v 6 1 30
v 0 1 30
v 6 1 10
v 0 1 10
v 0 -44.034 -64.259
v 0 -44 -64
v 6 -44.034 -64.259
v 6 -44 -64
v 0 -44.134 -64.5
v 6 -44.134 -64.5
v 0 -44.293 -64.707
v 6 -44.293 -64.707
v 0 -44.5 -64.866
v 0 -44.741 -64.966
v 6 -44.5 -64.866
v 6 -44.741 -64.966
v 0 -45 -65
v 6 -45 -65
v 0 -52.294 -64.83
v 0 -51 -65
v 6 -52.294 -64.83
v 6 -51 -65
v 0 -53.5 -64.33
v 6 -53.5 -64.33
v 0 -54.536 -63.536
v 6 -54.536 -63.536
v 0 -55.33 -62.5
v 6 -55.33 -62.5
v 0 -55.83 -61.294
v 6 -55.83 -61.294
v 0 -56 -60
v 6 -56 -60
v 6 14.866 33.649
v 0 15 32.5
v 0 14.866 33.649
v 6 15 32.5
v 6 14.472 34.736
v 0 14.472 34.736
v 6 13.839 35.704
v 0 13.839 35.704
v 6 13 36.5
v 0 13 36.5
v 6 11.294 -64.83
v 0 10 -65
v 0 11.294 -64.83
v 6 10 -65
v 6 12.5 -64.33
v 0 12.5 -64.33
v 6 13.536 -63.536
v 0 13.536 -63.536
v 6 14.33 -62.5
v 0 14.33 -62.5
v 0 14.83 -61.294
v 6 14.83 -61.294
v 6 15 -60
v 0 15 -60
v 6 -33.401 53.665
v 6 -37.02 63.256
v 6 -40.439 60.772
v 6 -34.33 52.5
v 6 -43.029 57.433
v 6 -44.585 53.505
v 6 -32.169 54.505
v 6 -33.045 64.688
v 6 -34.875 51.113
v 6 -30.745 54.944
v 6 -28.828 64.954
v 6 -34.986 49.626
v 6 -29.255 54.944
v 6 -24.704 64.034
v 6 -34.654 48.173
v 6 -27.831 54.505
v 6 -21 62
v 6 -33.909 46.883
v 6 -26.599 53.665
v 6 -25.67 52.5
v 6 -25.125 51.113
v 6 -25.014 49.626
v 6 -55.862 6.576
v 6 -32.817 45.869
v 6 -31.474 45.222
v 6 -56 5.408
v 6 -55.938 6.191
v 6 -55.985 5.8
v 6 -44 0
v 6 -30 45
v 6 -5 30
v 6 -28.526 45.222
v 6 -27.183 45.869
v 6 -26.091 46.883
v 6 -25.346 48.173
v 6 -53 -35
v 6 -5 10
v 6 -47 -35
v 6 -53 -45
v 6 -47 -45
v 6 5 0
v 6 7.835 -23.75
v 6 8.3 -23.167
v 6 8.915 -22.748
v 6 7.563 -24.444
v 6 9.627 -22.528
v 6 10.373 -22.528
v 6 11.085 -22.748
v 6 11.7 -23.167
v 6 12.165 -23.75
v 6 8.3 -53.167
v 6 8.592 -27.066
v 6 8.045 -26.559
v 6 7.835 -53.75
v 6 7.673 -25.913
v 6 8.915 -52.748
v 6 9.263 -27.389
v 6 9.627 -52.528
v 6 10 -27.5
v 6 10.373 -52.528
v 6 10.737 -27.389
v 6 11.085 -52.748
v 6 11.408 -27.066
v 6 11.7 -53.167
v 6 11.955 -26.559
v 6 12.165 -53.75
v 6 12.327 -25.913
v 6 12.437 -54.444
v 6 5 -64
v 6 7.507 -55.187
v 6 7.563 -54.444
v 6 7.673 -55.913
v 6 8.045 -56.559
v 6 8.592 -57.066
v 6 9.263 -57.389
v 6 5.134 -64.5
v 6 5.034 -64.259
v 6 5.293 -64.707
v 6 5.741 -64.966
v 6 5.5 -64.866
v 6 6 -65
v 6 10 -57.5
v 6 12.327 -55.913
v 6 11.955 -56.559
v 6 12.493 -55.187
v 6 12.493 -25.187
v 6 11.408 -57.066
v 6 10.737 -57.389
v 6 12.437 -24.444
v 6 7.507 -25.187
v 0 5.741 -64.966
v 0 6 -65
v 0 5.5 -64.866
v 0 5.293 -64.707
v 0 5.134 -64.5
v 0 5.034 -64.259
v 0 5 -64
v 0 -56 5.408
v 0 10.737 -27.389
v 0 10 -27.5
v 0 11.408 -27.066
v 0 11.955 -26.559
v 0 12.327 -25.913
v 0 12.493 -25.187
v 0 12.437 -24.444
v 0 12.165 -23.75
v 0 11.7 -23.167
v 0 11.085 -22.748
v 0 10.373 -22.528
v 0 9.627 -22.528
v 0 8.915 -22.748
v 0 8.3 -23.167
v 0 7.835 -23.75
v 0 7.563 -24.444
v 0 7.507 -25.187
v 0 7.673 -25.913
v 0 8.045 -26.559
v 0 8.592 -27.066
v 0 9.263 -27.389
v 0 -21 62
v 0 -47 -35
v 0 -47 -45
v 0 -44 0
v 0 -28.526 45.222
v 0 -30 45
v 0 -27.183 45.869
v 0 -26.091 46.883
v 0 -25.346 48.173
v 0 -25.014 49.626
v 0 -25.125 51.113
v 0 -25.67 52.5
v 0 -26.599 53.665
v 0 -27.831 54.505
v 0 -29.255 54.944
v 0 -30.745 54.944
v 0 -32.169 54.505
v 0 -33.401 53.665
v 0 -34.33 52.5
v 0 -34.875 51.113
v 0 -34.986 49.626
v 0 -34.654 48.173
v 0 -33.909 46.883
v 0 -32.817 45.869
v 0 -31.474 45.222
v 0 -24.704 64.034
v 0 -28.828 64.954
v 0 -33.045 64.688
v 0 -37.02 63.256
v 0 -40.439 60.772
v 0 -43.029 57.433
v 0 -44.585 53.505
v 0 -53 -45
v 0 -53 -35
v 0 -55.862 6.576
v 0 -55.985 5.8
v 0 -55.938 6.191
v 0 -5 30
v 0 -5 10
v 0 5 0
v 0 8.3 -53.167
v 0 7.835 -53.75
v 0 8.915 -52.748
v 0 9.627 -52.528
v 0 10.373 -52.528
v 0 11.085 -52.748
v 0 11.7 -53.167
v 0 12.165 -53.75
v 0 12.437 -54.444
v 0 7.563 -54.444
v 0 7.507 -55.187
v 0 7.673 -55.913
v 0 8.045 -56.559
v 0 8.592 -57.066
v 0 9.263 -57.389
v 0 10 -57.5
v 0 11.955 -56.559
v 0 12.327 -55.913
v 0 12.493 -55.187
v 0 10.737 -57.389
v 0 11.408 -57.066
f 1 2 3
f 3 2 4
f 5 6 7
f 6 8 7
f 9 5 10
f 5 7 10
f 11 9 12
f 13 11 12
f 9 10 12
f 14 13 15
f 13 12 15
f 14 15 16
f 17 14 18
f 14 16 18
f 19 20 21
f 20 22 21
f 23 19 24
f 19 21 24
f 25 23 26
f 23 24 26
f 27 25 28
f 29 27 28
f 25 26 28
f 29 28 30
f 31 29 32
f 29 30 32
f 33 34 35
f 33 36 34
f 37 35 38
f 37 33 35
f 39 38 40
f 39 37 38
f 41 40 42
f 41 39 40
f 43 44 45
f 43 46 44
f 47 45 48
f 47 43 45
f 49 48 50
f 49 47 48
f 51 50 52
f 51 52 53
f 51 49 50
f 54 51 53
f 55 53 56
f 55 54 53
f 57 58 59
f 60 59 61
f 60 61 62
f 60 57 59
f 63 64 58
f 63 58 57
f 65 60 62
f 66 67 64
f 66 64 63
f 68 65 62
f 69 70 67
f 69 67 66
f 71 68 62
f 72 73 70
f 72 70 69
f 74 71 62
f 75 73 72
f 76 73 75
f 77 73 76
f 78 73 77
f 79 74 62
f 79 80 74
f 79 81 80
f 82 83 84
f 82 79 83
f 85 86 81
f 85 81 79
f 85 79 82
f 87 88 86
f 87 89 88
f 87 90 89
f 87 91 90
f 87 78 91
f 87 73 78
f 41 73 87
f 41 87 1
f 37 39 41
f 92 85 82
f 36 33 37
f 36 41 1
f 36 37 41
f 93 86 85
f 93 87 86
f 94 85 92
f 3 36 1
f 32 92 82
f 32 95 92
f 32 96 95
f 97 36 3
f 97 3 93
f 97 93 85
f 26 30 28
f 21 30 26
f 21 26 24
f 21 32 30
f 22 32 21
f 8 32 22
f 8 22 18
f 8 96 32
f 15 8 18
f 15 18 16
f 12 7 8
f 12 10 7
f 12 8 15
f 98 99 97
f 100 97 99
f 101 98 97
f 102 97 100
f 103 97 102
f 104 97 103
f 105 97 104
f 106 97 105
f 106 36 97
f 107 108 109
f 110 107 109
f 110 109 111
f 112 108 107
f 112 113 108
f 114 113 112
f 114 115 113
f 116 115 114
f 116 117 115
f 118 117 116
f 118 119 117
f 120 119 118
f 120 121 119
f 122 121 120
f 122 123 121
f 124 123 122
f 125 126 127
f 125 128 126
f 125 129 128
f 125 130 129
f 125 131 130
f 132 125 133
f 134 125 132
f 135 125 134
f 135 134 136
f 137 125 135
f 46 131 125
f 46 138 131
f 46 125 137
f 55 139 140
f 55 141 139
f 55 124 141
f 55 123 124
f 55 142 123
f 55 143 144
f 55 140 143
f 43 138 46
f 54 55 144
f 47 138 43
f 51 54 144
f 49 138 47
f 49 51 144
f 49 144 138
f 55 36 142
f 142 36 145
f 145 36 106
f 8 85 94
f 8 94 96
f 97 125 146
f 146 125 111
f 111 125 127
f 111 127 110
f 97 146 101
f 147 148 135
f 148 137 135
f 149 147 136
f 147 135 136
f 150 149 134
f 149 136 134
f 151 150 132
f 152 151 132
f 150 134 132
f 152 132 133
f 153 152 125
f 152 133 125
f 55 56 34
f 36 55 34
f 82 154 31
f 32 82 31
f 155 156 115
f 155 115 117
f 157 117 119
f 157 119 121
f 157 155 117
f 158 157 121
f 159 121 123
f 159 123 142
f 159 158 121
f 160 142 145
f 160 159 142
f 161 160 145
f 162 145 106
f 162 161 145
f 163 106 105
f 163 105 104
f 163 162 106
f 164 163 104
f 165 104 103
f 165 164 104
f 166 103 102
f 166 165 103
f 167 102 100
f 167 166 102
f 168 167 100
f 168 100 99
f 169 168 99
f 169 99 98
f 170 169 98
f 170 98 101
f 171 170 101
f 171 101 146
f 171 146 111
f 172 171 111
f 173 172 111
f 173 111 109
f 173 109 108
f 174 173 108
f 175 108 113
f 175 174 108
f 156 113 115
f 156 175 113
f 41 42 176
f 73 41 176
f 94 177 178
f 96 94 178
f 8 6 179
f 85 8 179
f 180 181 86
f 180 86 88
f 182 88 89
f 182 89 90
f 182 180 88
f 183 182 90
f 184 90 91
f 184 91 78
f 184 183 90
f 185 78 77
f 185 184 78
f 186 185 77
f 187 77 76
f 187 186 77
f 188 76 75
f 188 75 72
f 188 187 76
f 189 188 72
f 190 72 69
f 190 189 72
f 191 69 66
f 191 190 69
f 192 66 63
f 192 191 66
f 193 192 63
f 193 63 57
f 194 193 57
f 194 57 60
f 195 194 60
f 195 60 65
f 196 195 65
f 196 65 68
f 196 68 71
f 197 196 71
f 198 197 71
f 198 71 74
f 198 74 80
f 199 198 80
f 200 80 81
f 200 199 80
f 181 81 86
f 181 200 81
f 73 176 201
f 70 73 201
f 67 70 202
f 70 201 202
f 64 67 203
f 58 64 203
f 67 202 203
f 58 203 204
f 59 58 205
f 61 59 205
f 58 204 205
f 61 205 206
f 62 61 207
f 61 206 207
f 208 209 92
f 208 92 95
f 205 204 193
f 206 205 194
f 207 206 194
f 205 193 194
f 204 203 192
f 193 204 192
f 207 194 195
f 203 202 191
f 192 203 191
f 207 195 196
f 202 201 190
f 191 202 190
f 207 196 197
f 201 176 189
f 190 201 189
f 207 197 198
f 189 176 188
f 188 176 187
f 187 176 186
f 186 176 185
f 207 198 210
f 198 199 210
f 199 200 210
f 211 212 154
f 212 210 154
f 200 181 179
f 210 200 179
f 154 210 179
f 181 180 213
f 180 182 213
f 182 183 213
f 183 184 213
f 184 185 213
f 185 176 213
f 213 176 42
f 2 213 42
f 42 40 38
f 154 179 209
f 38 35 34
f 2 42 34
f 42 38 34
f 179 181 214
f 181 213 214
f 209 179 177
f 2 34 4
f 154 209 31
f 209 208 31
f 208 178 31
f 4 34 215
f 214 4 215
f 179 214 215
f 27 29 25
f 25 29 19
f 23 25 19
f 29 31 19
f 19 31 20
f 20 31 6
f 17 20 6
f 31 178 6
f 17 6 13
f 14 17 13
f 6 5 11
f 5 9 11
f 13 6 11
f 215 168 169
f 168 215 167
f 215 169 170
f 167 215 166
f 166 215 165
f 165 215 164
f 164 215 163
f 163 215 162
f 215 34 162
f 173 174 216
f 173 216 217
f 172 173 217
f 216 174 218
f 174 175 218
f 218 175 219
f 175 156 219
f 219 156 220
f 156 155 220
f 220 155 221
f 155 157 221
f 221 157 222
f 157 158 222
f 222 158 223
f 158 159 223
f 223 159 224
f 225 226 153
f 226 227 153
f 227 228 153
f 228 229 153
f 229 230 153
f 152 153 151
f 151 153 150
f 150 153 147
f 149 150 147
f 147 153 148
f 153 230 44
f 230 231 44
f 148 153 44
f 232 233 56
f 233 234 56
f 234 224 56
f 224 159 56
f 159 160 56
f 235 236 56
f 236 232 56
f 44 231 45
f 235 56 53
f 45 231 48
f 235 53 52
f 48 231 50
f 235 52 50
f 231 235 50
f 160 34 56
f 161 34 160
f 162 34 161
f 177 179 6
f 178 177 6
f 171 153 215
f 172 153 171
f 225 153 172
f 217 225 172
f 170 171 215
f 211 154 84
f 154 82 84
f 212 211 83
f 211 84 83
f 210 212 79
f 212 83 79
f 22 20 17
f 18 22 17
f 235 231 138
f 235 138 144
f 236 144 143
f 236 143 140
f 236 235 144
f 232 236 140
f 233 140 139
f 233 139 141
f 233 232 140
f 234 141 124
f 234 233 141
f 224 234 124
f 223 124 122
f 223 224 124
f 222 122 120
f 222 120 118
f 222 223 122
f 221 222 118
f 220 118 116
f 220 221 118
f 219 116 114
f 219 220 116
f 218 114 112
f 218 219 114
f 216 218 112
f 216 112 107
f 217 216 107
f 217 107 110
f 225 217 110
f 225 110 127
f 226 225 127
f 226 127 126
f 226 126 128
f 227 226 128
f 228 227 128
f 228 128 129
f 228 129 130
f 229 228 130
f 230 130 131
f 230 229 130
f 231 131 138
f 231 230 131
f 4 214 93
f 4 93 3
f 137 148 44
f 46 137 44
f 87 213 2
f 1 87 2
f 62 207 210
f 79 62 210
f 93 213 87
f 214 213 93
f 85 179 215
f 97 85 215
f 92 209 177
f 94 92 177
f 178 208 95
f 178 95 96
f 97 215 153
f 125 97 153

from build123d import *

# Parameters (mm, degrees)
SKETCH1_R           = 5
SKETCH1_R_2         = 2.5
SKETCH1_W           = 10
SKETCH1_H           = 6
SKETCH1_W_2         = 20
BOSS_EXTRUDE1_DEPTH = 6
FILLET1_R           = 5
FILLET2_R           = 1


with BuildPart() as part:
    # Sketch1 → Boss-Extrude1 (new body)
    with BuildSketch(Plane(origin=(0, 0, 0), x_dir=(0, 0, -1), z_dir=(1, 0, 0))):
        with BuildLine():
            Line((0, 5), (65, 5))
            Line((65, 5), (65, 15))
            Line((65, 15), (-35, 15))
            Line((-35, 15), (-62, -21))
            ThreePointArc((-62, -21), (-64.112397745, -35.083328622), (-53.504672381, -44.584830184))
            Line((-53.504672381, -44.584830184), (-6, -56))
            Line((-6, -56), (65, -56))
            Line((65, -56), (65, -44))
            Line((65, -44), (0, -44))
            Line((0, -44), (0, 5))
        make_face()
        with Locations((-50, -30)):
            Circle(SKETCH1_R, mode=Mode.SUBTRACT)
        with Locations((55, 10)):
            Circle(SKETCH1_R_2, mode=Mode.SUBTRACT)
        with Locations((25, 10)):
            Circle(SKETCH1_R_2, mode=Mode.SUBTRACT)
        with Locations((40, -50)):
            Rectangle(SKETCH1_W, SKETCH1_H, mode=Mode.SUBTRACT)
        with Locations((-20, -2)):
            Rectangle(SKETCH1_W_2, SKETCH1_H, mode=Mode.SUBTRACT)
    extrude(amount=BOSS_EXTRUDE1_DEPTH)

    # Fillet1
    fillet1_edges = [part.edges().sort_by_distance(p)[0] for p in [
        (3, -56, -65),
        (3, -56, 6),
        (3, 15, 35),
        (3, 15, -65),
    ]]
    fillet(fillet1_edges, radius=FILLET1_R)

    # Fillet2
    fillet2_edges = [part.edges().sort_by_distance(p)[0] for p in [
        (3, 5, -65),
        (3, -44, -65),
    ]]
    fillet(fillet2_edges, radius=FILLET2_R)


solid = part.part
